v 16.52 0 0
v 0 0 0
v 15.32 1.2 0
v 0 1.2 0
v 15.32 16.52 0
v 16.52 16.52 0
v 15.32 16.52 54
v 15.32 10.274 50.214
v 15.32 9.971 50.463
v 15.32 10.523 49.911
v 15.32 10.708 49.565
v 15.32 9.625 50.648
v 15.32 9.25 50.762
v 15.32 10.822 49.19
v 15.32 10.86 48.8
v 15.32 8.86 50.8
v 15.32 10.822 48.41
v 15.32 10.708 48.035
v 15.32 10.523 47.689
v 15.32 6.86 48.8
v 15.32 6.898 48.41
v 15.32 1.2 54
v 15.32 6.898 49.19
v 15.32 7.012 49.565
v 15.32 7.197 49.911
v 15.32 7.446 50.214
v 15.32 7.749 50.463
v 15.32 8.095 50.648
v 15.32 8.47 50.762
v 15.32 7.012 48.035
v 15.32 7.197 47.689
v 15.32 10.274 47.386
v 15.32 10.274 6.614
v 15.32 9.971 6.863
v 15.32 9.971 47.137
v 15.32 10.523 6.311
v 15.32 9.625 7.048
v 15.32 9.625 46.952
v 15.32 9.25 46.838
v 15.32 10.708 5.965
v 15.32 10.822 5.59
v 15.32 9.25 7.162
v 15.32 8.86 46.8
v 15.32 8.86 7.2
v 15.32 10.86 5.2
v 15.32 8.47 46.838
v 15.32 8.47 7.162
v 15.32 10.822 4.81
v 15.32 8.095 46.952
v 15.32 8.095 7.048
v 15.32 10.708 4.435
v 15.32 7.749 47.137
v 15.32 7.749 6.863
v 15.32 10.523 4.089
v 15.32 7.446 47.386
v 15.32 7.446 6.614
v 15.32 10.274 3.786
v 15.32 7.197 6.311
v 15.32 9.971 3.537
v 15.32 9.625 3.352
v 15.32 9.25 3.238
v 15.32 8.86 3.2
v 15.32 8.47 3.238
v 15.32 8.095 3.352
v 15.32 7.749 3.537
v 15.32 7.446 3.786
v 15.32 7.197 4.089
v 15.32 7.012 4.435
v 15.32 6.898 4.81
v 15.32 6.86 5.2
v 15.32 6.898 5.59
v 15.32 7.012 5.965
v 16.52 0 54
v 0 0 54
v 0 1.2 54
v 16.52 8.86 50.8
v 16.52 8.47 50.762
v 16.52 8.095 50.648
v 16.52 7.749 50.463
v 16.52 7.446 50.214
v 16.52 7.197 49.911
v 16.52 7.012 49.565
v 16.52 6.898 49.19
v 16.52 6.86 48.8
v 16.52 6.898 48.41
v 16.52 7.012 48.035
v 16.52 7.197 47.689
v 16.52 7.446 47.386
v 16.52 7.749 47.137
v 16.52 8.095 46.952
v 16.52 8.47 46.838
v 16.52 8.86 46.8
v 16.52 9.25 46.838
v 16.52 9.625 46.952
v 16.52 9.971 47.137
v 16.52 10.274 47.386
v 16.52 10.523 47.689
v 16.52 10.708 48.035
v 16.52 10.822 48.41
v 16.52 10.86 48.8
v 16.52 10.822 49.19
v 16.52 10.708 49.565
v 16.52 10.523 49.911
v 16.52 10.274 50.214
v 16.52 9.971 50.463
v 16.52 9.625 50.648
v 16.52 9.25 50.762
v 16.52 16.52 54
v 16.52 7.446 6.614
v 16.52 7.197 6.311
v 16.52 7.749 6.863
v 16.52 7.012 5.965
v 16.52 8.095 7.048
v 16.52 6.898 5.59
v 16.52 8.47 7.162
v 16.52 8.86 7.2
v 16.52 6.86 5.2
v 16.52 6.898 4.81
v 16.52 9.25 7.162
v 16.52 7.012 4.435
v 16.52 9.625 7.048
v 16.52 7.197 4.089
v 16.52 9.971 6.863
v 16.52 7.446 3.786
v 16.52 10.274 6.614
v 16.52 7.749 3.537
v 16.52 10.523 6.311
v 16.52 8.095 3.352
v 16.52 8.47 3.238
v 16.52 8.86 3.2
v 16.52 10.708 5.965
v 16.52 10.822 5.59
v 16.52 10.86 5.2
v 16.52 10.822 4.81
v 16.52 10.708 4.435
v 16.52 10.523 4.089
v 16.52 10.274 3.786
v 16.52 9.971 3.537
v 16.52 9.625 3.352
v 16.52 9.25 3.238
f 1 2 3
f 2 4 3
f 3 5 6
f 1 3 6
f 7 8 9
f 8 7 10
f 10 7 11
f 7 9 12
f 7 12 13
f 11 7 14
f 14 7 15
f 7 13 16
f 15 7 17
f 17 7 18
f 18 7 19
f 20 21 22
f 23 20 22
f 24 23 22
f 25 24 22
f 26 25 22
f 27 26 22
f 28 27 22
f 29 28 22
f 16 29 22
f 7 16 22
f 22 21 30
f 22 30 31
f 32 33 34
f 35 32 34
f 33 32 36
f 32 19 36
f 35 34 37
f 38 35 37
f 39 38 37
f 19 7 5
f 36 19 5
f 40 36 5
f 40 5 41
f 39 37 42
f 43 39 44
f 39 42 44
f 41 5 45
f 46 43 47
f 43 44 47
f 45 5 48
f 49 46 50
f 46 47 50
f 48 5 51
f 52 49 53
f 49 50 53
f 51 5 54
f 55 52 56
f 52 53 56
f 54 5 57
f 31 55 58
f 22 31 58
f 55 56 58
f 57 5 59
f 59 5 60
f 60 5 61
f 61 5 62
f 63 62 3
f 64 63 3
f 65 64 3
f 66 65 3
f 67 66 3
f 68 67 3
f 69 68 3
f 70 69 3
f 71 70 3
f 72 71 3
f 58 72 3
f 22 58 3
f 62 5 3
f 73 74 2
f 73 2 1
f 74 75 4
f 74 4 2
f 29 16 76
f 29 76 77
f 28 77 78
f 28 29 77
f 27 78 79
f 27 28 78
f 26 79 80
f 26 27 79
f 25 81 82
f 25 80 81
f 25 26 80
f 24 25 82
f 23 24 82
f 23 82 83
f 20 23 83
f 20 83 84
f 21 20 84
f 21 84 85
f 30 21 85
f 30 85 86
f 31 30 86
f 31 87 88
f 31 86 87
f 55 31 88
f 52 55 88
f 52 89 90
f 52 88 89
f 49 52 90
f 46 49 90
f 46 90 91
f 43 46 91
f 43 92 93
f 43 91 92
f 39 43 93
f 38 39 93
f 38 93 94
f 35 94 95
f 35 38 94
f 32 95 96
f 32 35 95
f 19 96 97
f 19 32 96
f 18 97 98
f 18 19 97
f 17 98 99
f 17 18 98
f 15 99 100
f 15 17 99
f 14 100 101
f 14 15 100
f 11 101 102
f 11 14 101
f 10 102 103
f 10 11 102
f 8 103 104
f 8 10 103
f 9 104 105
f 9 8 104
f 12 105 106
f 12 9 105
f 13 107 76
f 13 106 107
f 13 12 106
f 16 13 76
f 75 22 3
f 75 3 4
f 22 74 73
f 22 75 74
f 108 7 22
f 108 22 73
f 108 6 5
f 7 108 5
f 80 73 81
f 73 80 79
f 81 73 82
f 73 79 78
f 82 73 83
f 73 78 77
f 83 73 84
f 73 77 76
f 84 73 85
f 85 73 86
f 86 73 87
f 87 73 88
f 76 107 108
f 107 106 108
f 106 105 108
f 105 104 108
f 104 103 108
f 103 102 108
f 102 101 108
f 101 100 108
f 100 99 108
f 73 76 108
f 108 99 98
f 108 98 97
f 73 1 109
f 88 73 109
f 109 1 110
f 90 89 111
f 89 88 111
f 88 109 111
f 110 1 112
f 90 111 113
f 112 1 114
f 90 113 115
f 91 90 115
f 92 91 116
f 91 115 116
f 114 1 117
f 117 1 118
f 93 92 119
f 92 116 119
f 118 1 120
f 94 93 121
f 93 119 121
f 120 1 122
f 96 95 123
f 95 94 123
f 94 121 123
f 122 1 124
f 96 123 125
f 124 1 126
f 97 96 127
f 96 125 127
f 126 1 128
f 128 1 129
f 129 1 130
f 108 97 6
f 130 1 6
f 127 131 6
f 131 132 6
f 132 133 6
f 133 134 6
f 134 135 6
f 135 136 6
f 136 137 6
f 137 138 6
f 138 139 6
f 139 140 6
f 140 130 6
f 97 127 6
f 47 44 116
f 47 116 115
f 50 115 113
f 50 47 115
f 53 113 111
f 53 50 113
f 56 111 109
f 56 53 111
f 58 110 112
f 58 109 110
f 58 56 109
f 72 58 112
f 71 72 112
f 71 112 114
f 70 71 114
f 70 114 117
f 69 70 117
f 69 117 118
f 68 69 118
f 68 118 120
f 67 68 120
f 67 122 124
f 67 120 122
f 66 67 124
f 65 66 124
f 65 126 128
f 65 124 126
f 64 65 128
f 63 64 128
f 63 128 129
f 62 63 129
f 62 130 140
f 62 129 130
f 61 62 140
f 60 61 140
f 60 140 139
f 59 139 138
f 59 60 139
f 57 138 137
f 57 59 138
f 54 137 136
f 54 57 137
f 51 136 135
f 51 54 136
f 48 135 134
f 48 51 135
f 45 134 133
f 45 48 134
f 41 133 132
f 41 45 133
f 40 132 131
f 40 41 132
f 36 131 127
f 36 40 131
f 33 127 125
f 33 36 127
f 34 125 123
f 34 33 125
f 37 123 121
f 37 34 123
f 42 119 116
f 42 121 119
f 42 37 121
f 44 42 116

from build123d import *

# Parameters (mm, degrees)
RESSALTO_EXTRUS_O1_DEPTH = 54
CORTE_EXTRUS_O1_START    = 10
ESBO_O2_R                = 2
CORTE_EXTRUS_O1_DEPTH    = 14


with BuildPart() as part:
    # Esboço1 → Ressalto-extrusão1 (new body)
    with BuildSketch(Plane.XY):
        Polygon((0, 0), (16.52, 0), (16.52, 16.52), (15.32, 16.52), (15.32, 1.2), (0, 1.2), align=None)
    extrude(amount=RESSALTO_EXTRUS_O1_DEPTH)

    # Esboço2 → Corte-extrusão1 (cut)
    with BuildSketch(Plane(origin=(0, 0, 0), x_dir=(0, 0, -1), z_dir=(1, 0, 0)).offset(CORTE_EXTRUS_O1_START)):
        with Locations(Location((-5.2, 8.86, 0), (0, 0, 180))):
            Circle(ESBO_O2_R)
        with Locations(Location((-48.8, 8.86, 0), (0, 0, 180))):
            Circle(ESBO_O2_R)
    extrude(amount=CORTE_EXTRUS_O1_DEPTH, mode=Mode.SUBTRACT)


solid = part.part
